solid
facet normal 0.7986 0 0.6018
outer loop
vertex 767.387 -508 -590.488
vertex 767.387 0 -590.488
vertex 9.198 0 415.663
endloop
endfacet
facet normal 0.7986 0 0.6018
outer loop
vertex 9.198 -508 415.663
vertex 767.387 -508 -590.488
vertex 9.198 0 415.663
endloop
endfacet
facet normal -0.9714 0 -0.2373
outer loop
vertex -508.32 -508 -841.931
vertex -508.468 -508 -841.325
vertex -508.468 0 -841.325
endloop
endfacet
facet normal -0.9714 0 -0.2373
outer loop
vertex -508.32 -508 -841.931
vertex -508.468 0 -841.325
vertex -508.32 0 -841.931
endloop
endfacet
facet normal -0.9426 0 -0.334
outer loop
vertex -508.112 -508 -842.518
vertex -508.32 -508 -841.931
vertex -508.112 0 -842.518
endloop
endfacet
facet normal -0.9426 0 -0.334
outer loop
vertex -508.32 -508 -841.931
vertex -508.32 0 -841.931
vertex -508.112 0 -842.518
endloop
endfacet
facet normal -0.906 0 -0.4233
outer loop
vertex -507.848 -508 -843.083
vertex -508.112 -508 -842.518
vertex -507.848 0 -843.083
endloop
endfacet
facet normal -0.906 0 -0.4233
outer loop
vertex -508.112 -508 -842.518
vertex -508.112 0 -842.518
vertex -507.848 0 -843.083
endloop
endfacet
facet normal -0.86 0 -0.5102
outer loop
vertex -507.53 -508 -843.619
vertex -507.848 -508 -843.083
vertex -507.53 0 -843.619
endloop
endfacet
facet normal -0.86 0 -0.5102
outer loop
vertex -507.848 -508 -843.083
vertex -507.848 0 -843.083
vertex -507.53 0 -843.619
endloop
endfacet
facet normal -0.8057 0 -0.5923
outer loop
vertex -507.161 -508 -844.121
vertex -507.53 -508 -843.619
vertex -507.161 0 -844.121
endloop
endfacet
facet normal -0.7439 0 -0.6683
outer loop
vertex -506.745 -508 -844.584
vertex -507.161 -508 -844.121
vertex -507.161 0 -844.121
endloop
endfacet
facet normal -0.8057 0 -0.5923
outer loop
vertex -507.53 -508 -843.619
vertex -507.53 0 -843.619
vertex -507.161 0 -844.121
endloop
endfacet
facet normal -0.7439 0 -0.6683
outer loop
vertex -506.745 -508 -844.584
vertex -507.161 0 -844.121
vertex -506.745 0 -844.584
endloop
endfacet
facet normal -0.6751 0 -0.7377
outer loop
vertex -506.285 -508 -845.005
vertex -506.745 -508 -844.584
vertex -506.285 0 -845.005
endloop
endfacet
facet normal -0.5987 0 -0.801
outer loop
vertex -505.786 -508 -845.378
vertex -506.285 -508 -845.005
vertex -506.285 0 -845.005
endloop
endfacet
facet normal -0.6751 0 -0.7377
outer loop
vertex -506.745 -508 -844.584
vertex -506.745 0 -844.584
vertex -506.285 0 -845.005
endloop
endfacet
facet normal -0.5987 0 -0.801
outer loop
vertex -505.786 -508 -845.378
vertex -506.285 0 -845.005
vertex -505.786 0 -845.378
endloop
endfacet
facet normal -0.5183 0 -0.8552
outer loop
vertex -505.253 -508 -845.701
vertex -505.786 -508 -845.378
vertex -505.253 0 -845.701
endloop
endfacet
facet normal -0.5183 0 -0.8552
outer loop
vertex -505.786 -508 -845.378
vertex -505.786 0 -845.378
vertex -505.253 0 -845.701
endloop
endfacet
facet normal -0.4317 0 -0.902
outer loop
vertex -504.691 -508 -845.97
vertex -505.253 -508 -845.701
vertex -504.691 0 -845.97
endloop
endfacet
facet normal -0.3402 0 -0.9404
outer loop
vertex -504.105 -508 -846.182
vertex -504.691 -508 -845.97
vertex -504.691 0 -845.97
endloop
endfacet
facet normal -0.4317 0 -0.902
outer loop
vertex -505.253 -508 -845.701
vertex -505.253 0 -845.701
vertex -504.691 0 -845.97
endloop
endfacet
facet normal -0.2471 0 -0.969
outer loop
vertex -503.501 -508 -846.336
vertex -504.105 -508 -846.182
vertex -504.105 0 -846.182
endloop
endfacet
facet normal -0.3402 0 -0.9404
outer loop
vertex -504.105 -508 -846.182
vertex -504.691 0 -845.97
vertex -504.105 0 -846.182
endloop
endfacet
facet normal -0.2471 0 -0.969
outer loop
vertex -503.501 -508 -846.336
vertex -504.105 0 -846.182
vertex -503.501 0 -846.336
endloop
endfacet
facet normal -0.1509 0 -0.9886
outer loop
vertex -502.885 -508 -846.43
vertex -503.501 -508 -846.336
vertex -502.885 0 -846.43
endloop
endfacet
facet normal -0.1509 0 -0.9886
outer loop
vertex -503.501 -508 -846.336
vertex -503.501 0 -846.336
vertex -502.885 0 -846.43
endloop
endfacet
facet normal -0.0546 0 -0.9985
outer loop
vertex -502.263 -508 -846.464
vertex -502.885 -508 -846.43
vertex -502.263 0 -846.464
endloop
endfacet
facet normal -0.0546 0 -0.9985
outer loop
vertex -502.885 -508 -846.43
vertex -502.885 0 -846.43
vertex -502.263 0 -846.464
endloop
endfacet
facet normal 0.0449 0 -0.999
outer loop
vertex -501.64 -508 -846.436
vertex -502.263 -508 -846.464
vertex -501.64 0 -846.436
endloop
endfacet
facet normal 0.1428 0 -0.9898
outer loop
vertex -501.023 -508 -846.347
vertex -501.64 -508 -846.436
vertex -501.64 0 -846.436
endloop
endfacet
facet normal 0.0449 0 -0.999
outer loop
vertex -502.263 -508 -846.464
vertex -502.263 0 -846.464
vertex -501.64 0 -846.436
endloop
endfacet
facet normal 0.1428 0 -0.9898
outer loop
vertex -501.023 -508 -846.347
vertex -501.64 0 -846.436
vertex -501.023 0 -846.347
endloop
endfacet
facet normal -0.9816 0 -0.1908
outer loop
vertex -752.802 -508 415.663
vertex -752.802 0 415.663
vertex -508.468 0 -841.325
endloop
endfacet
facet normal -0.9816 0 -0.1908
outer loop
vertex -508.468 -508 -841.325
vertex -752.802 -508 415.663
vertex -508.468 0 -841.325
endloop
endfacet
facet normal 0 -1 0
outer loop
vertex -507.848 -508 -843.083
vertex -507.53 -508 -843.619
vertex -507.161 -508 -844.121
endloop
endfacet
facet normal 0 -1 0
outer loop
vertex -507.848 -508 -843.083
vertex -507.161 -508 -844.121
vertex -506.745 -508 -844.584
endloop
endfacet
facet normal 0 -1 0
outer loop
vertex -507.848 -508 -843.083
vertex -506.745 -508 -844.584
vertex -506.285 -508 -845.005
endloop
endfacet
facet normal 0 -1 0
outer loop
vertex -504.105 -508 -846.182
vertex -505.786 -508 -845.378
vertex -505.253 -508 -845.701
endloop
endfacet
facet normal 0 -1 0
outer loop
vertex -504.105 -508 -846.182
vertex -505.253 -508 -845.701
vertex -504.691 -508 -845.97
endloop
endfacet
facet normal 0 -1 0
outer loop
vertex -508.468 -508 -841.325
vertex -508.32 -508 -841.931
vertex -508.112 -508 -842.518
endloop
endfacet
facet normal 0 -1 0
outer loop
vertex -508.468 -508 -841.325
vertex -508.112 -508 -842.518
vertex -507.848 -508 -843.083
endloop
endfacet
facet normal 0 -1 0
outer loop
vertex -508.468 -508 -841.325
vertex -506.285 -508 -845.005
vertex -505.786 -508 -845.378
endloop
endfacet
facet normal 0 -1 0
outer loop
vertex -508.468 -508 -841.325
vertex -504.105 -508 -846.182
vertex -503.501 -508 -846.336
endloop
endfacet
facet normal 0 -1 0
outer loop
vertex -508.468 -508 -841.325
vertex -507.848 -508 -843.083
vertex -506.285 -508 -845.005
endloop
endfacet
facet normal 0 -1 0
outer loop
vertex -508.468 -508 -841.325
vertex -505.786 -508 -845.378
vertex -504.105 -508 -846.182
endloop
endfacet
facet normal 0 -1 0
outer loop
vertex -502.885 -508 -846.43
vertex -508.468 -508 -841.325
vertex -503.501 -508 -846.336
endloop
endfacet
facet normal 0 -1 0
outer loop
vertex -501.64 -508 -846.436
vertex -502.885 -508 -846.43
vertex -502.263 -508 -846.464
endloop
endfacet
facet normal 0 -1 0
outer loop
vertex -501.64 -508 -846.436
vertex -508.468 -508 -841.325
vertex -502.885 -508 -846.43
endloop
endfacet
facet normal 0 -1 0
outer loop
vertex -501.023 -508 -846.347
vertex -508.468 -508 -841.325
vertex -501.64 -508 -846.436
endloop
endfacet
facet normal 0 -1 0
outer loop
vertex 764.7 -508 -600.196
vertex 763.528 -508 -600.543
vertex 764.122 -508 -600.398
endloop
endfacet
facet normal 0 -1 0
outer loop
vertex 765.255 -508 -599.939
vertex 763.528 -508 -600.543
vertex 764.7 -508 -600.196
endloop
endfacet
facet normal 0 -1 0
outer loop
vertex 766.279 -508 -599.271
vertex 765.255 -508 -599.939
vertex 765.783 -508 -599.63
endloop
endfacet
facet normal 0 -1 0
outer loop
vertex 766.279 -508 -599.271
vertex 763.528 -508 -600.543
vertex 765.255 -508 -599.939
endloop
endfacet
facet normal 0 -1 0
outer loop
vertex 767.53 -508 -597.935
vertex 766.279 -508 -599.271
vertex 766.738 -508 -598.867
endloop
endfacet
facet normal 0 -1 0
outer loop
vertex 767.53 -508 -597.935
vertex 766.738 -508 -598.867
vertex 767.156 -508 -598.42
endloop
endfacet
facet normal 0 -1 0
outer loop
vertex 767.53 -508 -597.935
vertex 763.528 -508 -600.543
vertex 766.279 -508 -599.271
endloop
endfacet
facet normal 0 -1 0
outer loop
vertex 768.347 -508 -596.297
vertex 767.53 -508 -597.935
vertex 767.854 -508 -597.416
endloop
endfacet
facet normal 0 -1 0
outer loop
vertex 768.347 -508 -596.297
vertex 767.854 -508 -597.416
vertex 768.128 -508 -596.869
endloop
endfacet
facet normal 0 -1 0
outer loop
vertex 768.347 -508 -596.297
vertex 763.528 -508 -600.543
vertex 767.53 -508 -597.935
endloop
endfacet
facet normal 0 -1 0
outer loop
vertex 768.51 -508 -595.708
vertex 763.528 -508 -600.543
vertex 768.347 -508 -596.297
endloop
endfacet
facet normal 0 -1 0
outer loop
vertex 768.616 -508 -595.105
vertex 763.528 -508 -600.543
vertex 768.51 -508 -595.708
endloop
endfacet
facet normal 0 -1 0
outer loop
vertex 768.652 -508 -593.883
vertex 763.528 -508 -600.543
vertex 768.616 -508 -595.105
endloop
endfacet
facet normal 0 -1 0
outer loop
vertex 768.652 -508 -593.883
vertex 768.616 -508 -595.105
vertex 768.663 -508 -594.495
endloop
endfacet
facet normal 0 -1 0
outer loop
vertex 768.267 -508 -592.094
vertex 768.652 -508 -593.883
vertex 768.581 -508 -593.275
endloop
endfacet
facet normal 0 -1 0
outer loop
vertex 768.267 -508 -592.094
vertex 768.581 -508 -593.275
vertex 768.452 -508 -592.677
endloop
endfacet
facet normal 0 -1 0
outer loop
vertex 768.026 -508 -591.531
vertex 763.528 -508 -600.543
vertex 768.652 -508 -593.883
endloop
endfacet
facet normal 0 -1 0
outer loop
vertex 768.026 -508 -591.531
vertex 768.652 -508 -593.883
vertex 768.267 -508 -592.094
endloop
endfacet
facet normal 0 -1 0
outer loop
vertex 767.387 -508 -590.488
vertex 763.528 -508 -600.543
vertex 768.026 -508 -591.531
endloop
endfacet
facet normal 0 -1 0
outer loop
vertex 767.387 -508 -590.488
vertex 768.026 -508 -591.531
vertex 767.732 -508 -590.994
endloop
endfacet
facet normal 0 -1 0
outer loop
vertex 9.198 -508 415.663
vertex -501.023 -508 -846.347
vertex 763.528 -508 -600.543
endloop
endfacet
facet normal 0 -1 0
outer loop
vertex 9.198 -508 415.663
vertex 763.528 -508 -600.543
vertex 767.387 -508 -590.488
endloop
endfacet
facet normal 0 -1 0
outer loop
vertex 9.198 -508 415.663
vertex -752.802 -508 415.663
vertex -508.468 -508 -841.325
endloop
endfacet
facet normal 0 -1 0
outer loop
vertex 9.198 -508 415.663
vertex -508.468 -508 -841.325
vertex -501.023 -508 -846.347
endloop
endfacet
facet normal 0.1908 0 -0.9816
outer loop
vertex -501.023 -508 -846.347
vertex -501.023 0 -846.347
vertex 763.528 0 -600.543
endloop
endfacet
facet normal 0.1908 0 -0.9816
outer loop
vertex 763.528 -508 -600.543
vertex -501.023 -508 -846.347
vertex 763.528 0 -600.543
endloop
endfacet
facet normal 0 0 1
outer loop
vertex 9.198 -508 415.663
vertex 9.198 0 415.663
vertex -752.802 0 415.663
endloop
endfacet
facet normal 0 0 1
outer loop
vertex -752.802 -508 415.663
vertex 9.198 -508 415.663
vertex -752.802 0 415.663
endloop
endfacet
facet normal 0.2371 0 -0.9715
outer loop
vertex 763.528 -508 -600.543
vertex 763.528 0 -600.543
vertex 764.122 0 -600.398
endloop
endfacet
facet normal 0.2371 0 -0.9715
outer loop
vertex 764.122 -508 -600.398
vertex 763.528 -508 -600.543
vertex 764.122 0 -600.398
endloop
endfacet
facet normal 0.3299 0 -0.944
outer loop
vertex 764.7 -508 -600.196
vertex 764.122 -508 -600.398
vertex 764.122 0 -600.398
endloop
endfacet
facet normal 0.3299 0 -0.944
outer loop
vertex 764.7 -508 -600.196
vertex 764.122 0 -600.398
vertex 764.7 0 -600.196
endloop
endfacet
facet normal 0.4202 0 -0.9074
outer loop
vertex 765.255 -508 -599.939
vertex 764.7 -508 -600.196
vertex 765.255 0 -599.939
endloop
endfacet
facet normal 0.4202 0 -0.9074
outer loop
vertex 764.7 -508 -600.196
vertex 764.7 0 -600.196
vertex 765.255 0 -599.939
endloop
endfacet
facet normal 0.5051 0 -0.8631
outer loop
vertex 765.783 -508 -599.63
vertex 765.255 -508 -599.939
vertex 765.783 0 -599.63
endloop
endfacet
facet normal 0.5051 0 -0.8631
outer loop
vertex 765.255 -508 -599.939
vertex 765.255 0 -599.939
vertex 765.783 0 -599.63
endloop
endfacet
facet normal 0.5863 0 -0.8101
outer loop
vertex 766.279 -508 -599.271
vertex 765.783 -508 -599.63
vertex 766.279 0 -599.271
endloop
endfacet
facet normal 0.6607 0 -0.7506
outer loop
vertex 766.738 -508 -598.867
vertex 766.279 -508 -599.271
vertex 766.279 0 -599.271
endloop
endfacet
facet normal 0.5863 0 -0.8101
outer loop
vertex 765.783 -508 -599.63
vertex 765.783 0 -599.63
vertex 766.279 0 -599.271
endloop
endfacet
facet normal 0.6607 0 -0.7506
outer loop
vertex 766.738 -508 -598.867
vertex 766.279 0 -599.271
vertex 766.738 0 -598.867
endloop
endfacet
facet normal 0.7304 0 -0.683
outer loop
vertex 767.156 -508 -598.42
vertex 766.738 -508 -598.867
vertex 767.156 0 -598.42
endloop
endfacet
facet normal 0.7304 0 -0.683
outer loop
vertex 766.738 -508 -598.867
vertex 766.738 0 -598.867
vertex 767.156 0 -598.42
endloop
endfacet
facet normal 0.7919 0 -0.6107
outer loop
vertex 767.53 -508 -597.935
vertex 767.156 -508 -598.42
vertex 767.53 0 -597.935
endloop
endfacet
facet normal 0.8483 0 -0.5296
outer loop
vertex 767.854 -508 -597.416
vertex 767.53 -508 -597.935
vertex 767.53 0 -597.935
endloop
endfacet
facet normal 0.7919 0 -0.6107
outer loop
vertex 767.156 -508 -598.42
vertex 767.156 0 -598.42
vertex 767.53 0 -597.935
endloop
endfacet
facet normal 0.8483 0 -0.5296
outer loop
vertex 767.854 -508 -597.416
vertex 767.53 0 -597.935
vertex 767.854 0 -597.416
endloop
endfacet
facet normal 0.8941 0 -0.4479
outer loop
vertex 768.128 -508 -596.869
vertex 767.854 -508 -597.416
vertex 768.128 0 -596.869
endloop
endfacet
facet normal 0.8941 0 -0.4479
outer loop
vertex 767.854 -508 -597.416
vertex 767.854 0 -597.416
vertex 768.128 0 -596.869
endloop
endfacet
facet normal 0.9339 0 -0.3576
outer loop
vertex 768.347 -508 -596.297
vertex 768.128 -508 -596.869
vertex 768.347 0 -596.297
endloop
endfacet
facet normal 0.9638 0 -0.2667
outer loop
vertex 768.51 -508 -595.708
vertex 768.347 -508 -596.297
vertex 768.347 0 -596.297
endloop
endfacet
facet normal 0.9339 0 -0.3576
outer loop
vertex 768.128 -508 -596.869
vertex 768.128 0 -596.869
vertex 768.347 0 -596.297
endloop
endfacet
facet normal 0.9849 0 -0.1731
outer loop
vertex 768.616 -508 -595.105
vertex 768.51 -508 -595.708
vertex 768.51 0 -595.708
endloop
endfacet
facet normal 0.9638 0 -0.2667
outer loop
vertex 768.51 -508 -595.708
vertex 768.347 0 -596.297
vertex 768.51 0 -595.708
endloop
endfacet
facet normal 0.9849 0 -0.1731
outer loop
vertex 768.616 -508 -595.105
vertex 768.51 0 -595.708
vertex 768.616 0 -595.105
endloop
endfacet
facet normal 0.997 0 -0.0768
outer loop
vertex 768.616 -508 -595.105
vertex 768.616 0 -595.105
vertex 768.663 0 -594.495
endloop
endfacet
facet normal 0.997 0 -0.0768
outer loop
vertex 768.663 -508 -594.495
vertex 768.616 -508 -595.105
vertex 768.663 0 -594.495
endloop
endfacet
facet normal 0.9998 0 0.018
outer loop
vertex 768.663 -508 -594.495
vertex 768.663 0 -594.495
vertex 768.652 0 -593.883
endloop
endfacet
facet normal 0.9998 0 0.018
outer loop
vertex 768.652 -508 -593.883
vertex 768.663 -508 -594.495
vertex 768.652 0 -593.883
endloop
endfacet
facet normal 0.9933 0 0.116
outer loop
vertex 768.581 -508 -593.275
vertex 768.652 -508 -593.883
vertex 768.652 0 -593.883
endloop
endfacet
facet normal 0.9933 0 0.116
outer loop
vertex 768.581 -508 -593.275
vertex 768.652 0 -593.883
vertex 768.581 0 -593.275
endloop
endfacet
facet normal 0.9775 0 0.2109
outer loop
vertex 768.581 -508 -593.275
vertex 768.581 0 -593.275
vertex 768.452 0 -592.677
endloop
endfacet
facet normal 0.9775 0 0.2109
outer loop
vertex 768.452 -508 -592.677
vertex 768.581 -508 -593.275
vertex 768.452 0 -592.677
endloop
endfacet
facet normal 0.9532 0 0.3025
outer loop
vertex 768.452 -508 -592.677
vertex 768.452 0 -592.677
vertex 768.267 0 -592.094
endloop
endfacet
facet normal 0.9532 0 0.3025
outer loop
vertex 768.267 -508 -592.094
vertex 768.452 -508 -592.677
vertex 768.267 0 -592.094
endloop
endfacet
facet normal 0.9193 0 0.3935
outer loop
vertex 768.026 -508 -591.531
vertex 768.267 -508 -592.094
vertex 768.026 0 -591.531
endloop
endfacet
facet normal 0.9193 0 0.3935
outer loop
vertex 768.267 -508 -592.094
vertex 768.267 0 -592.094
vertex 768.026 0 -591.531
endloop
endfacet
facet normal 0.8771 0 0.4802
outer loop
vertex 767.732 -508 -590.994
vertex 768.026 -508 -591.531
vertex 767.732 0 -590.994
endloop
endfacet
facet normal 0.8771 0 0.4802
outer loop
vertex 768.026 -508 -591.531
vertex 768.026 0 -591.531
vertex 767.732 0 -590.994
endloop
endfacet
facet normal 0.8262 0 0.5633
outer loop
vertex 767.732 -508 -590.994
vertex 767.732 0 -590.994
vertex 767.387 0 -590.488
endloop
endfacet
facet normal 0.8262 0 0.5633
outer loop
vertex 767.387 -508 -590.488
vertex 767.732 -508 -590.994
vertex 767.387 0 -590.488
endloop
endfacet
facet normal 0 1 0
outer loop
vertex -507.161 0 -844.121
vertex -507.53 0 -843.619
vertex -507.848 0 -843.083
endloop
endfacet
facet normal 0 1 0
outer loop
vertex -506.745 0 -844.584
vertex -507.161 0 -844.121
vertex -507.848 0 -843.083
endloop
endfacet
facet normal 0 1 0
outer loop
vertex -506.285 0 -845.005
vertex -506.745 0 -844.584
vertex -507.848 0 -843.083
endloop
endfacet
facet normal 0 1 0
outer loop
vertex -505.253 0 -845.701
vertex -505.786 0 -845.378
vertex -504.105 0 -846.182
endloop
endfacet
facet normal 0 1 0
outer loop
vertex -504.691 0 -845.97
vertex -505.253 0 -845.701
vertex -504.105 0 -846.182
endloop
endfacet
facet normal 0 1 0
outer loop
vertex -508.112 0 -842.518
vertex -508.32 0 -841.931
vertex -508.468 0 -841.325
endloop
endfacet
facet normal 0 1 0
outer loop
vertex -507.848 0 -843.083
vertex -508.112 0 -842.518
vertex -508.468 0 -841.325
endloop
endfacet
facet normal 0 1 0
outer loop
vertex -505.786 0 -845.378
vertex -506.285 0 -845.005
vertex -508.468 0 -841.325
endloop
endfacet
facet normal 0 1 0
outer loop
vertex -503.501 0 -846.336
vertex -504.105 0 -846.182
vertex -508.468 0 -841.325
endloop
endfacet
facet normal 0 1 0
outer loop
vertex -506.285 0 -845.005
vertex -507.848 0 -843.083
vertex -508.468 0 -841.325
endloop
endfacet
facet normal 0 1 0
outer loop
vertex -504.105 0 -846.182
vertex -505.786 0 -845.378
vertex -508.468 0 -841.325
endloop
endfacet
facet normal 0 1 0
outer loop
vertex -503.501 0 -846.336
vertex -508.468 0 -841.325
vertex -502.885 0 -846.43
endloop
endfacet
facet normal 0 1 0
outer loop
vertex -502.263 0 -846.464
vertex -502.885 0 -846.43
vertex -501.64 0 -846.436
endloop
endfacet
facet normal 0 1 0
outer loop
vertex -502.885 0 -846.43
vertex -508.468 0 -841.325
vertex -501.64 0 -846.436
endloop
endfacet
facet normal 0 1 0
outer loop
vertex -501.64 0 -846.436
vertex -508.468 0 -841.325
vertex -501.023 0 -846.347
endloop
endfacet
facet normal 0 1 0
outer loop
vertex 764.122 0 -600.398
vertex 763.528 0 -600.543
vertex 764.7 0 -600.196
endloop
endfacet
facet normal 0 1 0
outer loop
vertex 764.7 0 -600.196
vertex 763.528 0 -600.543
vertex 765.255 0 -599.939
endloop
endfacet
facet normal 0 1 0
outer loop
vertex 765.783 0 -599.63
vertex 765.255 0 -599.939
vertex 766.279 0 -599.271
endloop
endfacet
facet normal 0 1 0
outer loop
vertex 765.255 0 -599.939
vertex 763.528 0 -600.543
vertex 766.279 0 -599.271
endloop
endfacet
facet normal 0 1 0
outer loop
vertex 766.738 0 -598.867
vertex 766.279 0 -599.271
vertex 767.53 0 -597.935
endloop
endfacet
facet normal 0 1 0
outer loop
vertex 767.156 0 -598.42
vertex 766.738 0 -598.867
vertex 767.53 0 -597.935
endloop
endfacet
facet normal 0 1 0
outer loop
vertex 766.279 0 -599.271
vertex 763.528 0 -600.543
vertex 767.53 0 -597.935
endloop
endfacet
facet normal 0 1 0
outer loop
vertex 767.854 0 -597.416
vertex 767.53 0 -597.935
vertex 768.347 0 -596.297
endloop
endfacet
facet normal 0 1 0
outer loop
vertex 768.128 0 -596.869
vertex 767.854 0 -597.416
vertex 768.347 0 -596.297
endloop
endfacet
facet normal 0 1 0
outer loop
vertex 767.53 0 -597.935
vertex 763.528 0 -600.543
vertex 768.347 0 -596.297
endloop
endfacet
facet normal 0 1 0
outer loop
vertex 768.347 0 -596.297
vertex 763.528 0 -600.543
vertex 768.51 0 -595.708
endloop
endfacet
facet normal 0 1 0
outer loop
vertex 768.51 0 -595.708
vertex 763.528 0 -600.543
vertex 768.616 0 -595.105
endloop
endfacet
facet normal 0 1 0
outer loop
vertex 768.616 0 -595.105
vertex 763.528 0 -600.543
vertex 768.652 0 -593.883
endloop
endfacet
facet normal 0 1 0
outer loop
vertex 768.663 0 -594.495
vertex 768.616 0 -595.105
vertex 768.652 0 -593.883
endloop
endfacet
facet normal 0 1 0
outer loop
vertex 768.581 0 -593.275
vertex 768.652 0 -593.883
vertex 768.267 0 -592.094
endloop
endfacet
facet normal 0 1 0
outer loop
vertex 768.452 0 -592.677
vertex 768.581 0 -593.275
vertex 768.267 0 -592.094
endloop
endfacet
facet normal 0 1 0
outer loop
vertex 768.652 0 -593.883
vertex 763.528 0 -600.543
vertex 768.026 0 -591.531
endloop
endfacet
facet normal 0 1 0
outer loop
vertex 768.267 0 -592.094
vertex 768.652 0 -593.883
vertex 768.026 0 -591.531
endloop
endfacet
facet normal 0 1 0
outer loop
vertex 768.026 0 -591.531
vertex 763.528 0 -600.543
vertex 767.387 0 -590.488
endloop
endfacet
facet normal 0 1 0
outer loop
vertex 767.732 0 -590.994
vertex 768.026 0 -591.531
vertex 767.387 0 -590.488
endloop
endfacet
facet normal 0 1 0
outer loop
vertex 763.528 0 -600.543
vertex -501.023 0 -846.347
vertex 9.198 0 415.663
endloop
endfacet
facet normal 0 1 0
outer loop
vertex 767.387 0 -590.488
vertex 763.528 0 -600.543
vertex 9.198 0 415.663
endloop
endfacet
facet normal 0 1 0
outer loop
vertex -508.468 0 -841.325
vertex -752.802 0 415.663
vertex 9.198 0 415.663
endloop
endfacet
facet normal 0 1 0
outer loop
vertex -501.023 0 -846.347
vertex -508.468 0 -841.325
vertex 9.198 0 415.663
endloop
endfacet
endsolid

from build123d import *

# Parameters (mm, degrees)
F1_DEPTH = 508


with BuildPart() as f1:
    # F0 (on Front) → F1 (new body)
    with BuildSketch(Plane.XZ):
        with BuildLine():
            ThreePointArc((-508.468338, -841.325435), (-505.78588, -845.378186), (-501.023368, -846.34713))
            Line((-501.023368, -846.34713), (763.527564, -600.543329))
            ThreePointArc((763.527564, -600.543329), (768.244163, -596.585633), (767.387262, -590.488471))
            Line((767.387262, -590.488471), (9.197902, 415.662793))
            Line((9.197902, 415.662793), (-752.802098, 415.662793))
            Line((-752.802098, 415.662793), (-508.468338, -841.325435))
        make_face()
    extrude(amount=F1_DEPTH)


solid = f1.part
